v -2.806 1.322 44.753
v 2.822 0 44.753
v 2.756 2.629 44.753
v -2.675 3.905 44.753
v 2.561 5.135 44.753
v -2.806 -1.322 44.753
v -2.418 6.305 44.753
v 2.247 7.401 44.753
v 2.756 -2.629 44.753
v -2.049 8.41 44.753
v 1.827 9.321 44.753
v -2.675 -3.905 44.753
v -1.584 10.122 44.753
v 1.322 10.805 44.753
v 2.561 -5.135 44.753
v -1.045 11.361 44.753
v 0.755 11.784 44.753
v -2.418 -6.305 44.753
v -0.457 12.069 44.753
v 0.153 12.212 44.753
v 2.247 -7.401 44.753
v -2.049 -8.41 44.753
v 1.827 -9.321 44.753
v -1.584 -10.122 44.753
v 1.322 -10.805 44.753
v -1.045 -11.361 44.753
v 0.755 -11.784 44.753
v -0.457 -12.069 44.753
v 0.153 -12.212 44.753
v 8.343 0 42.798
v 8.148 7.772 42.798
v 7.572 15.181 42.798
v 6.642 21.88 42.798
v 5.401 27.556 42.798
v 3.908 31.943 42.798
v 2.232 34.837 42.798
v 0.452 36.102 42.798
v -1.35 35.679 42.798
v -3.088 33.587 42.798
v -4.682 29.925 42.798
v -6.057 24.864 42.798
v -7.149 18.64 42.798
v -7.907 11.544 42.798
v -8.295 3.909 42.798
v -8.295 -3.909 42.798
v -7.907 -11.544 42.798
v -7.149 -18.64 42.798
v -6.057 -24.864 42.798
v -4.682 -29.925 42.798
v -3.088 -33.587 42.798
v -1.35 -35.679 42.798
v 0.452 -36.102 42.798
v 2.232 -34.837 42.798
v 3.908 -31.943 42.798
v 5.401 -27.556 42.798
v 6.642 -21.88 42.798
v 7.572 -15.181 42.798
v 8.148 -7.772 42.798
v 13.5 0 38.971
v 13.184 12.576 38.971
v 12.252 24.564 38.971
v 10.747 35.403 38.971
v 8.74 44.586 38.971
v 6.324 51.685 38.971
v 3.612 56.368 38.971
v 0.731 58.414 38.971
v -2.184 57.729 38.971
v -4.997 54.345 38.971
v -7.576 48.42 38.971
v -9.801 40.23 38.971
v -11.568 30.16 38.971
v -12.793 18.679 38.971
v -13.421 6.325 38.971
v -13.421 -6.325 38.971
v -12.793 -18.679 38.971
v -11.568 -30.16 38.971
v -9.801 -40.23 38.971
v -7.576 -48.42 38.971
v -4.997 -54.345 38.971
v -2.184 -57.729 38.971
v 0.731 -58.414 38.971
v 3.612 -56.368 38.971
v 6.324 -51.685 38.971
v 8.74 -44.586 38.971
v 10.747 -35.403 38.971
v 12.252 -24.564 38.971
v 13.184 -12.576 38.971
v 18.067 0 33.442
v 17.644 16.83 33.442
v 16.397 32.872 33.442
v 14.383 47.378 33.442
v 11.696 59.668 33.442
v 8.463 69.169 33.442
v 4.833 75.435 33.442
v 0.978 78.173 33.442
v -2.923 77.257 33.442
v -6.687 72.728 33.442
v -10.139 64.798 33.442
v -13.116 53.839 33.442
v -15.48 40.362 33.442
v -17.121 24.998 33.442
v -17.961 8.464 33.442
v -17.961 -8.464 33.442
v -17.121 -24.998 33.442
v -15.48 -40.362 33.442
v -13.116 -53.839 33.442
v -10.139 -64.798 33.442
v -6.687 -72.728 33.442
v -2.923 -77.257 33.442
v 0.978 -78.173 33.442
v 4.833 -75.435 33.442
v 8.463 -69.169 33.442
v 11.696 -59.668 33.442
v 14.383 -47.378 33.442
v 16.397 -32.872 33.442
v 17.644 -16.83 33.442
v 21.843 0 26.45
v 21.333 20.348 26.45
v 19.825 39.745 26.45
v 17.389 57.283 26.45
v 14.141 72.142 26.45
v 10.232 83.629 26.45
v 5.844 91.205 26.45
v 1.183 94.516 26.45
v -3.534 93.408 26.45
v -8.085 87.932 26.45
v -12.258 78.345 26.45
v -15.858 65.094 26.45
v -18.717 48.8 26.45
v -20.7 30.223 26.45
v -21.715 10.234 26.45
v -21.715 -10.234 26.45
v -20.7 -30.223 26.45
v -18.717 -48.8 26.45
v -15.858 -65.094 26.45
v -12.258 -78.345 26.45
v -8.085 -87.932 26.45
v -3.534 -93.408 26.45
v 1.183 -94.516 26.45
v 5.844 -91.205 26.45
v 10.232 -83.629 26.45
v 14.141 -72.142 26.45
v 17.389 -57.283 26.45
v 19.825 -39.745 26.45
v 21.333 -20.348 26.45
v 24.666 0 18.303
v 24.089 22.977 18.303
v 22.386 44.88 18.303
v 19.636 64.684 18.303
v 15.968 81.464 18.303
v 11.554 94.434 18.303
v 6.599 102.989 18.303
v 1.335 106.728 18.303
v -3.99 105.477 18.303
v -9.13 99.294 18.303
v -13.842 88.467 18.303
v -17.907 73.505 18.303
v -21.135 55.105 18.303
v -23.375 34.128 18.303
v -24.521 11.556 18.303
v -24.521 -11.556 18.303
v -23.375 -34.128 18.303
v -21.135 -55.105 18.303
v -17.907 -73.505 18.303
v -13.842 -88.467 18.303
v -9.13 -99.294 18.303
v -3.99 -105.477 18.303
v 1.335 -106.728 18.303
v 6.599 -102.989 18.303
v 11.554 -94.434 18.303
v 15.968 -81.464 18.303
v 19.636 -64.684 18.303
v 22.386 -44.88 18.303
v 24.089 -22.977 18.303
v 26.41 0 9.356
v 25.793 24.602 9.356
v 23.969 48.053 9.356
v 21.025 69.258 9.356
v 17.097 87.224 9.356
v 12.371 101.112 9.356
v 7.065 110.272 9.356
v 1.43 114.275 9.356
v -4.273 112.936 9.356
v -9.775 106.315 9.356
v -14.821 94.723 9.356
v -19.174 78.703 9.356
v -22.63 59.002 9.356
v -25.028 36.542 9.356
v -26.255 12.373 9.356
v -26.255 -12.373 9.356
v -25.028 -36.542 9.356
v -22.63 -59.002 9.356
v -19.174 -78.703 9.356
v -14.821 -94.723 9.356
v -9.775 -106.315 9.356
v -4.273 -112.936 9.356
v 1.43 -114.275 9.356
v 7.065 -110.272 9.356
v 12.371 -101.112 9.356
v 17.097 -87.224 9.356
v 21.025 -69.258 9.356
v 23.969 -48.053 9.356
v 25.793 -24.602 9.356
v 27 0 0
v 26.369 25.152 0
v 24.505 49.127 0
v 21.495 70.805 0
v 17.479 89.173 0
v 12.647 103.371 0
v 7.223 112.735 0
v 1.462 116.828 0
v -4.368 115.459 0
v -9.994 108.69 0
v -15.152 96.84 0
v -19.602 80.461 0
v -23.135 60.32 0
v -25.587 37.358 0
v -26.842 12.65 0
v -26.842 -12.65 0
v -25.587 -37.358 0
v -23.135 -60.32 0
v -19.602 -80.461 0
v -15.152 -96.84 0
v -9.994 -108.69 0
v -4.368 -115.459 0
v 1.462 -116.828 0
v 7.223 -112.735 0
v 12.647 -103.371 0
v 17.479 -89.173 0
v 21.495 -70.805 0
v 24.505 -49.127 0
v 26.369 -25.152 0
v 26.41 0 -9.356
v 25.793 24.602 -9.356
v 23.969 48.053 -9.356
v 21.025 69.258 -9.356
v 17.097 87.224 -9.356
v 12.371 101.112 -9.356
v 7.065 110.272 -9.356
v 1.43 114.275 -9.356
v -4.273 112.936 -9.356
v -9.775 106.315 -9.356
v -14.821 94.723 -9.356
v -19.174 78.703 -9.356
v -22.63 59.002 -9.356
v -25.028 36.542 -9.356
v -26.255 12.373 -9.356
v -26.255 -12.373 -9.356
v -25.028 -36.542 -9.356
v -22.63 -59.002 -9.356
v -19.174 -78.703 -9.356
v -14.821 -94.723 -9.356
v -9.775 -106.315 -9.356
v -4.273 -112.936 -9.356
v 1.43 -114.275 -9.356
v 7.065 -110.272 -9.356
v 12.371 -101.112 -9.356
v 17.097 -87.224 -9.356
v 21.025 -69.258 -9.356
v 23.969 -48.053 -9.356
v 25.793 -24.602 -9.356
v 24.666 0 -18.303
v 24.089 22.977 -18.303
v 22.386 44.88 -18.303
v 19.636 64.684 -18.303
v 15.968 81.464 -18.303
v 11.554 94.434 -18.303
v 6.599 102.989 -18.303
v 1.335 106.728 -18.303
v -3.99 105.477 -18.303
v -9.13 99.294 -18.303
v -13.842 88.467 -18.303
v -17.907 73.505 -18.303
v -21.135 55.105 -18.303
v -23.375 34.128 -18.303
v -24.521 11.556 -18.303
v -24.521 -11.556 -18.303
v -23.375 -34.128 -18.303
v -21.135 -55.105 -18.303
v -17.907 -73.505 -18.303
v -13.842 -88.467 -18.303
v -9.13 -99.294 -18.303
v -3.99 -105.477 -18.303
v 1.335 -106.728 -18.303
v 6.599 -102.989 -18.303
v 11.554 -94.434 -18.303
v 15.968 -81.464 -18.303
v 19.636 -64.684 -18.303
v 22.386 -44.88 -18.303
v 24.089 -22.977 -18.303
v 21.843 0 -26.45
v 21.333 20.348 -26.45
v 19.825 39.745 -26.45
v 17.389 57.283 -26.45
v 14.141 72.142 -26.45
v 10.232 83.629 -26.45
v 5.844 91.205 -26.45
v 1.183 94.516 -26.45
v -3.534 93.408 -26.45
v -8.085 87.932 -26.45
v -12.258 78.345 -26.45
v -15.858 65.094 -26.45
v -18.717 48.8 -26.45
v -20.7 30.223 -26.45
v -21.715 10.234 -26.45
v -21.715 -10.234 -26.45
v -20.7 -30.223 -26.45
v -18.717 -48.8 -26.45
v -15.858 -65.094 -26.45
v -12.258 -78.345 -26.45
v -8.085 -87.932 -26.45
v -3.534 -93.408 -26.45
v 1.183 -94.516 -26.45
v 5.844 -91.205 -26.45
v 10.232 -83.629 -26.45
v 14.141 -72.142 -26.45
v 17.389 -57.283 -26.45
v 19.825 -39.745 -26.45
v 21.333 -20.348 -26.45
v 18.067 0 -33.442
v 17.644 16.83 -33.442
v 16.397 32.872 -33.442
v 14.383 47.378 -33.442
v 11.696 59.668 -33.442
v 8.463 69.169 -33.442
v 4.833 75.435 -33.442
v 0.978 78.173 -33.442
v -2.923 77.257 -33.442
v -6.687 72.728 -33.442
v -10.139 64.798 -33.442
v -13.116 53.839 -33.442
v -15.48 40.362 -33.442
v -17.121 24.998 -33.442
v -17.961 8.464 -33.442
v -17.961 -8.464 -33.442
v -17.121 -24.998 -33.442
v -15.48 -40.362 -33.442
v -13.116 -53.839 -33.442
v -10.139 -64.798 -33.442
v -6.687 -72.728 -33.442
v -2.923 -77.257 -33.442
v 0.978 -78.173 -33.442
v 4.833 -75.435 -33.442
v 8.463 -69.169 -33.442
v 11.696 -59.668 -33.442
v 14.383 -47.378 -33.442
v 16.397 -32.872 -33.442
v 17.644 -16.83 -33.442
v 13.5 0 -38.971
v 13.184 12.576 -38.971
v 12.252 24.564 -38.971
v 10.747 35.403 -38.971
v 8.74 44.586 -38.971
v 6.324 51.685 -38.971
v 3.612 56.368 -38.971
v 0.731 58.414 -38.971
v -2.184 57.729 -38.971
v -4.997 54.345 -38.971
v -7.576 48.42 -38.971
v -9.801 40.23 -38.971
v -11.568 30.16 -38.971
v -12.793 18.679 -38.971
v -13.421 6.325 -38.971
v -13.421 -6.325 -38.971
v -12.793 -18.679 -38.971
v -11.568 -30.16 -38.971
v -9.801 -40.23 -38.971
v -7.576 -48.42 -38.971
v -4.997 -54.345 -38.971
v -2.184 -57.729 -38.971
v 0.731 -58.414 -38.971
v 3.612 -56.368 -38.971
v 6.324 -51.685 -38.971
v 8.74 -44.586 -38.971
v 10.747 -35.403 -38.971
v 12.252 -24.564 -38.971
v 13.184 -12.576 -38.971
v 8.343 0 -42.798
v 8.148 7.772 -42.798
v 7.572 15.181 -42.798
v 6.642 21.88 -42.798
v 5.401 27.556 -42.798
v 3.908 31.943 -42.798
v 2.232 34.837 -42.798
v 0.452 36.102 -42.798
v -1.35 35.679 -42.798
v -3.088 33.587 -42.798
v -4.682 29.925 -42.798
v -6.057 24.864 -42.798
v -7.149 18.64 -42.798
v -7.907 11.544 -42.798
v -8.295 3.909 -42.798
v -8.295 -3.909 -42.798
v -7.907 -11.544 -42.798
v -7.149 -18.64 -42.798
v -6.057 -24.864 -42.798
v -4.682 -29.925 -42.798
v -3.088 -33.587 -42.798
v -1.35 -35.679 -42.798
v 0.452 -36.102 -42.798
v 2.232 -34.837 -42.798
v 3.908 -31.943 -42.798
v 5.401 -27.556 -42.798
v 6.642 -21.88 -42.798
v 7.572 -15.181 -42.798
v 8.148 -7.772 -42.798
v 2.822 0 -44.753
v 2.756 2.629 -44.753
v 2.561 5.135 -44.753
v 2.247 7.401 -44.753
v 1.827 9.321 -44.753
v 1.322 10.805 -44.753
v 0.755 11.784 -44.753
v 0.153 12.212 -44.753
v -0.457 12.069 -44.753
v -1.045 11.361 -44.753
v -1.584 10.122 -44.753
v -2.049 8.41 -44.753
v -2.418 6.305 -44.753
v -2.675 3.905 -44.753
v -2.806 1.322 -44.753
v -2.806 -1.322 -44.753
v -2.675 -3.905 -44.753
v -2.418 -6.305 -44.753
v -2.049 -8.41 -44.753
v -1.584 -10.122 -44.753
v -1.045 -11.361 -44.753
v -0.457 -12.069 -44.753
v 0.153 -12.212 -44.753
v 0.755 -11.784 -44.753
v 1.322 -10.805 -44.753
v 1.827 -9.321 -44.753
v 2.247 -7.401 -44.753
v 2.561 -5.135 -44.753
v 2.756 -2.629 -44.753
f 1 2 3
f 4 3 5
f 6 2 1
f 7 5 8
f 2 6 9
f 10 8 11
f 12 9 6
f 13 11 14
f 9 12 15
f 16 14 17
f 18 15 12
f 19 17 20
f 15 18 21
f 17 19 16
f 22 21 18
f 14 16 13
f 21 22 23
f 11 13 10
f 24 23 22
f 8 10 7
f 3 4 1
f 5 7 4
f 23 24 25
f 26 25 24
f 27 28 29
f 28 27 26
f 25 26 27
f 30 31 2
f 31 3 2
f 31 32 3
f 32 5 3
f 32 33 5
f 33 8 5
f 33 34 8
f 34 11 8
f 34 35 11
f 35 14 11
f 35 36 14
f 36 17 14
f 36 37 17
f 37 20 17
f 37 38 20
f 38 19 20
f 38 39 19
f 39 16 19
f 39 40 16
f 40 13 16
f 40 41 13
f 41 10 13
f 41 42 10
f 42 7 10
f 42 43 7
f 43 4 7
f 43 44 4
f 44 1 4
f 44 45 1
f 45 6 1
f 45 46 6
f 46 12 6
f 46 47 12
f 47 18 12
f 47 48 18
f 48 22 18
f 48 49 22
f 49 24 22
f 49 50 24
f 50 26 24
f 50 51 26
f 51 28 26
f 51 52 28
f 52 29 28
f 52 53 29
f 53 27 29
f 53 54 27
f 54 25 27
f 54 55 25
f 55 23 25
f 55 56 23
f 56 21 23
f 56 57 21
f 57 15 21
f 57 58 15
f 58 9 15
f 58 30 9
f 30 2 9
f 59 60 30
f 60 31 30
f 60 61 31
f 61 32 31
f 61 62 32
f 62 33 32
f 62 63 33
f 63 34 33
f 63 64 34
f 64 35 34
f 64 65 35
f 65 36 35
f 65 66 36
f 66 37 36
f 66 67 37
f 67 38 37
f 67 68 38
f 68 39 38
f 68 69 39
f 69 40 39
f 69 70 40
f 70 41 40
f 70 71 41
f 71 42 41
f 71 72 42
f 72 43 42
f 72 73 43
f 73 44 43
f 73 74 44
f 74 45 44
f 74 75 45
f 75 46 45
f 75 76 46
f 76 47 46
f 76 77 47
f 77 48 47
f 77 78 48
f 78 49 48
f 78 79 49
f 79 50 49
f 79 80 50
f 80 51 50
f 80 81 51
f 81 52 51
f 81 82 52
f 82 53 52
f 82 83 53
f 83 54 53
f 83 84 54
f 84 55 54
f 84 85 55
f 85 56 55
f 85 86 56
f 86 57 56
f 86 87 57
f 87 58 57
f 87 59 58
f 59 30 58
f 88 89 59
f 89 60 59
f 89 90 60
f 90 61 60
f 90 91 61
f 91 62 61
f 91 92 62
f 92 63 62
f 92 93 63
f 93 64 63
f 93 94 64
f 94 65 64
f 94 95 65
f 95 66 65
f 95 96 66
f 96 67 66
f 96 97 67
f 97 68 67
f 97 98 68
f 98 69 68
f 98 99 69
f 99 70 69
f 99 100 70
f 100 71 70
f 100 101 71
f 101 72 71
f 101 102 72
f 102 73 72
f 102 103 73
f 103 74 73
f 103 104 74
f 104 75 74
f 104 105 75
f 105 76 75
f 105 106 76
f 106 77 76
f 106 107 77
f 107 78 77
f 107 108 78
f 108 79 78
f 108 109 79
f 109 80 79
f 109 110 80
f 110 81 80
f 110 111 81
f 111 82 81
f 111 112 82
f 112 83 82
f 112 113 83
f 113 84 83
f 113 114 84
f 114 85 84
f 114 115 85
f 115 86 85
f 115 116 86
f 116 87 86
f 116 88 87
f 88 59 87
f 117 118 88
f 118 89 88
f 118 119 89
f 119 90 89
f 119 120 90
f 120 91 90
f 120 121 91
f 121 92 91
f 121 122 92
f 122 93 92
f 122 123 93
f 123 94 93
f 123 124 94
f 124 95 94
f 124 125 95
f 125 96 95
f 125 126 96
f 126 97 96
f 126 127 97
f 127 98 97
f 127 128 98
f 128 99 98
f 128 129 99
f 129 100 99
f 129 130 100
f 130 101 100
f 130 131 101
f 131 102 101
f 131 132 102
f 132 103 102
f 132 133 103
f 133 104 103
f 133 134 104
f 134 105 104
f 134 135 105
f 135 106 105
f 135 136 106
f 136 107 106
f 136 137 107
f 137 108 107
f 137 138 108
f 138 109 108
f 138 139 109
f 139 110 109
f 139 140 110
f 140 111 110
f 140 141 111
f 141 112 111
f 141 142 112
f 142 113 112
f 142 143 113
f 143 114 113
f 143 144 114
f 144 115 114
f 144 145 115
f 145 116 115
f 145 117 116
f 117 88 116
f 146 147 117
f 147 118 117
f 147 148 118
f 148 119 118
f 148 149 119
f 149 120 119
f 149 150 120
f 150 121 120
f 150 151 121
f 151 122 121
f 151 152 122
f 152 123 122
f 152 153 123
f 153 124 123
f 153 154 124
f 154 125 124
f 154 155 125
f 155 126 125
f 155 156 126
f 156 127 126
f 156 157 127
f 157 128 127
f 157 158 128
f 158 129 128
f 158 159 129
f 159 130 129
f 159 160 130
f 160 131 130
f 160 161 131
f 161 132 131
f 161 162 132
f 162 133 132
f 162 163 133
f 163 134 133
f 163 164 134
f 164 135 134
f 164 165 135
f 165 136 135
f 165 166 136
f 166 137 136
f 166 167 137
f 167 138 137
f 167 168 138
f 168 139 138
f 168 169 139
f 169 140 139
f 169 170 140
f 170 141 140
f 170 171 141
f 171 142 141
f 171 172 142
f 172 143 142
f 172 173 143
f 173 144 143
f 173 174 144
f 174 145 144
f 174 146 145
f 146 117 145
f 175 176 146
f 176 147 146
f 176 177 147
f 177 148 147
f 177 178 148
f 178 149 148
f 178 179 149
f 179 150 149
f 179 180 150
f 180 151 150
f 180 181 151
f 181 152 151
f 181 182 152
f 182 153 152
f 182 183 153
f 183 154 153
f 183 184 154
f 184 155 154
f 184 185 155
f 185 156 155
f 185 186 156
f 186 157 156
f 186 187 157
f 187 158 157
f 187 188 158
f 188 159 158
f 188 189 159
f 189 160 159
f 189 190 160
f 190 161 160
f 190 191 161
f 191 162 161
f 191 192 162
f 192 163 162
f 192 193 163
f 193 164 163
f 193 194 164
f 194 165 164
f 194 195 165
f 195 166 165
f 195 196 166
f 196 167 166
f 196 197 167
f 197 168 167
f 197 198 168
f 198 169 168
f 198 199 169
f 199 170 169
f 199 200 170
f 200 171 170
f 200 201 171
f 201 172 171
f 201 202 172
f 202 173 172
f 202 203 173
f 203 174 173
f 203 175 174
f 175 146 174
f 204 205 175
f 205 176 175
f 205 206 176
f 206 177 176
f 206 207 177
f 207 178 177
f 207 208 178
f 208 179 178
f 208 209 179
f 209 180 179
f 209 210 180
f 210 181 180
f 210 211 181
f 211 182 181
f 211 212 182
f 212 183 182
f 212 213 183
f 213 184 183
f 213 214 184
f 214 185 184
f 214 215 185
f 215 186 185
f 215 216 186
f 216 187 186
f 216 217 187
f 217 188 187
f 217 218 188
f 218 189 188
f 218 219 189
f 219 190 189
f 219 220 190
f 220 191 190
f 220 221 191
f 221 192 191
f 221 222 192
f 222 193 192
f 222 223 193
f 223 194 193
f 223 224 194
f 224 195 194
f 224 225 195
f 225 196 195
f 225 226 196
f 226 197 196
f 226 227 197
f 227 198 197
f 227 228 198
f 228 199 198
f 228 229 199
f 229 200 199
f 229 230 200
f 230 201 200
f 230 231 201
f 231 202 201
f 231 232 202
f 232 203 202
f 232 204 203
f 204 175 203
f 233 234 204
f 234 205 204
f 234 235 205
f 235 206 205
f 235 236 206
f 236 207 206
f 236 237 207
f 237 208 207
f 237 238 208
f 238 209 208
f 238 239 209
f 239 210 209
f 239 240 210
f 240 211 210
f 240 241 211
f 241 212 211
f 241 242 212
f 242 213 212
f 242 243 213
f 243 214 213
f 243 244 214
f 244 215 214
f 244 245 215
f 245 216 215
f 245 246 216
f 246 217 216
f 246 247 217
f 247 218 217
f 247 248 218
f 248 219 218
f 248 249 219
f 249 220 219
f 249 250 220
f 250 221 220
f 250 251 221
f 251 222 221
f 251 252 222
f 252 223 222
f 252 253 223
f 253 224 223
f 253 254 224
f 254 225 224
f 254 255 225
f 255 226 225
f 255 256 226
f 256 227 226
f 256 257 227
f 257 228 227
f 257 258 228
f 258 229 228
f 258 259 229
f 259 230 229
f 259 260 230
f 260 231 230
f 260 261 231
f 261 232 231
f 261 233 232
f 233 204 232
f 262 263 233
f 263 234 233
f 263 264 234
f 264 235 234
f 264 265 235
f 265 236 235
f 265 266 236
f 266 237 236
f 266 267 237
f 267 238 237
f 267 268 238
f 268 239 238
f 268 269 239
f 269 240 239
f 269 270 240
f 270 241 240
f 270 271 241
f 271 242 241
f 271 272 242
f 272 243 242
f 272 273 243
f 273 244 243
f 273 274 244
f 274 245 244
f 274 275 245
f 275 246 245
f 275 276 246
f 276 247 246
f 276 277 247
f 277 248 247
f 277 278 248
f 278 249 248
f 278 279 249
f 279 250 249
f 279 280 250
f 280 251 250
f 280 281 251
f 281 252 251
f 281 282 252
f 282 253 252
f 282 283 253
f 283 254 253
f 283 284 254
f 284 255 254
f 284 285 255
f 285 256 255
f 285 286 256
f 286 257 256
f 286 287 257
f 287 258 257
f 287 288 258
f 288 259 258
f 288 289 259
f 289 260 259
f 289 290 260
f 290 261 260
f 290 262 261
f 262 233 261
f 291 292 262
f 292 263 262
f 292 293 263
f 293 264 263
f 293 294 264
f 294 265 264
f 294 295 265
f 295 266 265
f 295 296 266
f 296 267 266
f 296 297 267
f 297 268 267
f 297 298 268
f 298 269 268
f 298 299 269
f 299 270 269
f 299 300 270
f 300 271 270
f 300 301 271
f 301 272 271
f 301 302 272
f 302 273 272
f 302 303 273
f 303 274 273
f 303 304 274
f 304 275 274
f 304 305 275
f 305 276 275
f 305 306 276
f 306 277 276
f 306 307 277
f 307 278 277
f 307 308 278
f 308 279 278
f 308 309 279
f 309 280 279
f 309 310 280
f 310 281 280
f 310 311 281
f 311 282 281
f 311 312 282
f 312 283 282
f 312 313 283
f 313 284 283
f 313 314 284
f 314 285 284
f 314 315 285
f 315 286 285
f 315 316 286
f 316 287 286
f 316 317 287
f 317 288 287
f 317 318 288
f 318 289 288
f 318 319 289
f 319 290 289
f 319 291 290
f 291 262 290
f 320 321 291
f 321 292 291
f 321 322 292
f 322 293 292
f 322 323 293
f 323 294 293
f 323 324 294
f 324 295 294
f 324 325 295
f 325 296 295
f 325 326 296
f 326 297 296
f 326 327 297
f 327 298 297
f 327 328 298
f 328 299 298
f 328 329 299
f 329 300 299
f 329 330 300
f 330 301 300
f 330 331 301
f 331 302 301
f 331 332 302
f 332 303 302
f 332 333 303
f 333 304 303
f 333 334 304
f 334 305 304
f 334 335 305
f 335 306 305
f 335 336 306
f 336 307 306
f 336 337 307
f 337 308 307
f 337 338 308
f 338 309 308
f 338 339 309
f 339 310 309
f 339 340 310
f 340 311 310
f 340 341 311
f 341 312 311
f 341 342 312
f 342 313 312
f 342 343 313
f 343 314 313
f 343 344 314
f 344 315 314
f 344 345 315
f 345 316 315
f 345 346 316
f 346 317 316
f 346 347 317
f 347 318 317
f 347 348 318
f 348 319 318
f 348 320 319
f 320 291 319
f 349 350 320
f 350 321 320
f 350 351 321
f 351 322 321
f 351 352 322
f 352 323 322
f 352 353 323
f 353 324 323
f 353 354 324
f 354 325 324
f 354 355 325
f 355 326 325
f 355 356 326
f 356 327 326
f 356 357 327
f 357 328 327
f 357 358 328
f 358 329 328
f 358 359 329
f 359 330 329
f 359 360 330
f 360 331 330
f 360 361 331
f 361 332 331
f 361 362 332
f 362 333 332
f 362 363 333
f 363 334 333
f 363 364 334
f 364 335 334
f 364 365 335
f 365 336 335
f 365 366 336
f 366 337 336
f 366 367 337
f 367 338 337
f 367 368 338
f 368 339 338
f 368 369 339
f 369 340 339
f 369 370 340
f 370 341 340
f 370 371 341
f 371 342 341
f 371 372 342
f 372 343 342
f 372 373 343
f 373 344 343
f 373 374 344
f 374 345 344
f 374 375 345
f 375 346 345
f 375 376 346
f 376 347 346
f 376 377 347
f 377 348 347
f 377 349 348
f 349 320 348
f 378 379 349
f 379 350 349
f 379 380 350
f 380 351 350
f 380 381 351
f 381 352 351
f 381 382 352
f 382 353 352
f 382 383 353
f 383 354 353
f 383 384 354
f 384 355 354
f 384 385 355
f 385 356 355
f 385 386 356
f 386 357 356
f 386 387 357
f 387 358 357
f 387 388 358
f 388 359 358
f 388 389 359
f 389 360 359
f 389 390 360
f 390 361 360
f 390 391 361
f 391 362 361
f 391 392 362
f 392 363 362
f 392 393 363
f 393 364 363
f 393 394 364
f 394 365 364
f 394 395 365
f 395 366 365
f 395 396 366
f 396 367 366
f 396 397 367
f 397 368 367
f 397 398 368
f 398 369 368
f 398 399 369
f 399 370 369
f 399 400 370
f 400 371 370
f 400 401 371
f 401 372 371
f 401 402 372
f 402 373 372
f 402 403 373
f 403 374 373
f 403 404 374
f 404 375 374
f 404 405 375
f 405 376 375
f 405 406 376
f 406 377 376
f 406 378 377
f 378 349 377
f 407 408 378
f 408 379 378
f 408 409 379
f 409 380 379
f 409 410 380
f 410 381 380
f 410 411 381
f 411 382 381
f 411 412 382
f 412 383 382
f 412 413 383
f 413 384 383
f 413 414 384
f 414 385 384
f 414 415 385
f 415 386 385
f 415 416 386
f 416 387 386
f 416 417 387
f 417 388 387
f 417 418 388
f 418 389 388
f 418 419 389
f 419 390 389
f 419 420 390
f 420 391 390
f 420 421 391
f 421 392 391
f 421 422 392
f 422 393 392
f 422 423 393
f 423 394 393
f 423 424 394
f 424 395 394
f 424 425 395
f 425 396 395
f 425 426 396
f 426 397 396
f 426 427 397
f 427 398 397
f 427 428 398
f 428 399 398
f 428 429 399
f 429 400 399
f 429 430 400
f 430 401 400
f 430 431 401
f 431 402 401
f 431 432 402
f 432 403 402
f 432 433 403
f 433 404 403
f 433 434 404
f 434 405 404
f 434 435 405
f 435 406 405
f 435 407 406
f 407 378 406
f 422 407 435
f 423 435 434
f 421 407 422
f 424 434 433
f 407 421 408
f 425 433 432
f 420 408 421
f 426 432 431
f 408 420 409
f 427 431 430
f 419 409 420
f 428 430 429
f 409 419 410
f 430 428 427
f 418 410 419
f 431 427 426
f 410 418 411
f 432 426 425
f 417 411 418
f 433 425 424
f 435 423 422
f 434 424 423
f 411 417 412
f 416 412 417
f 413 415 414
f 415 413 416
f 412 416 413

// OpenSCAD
// Generated by SolidPython 1.0.1 on 2020-07-29 00:46:45


scale(v = [3, 13, 5]) {
	sphere(r = 9);
}
/***********************************************
*********      SolidPython code:      **********
************************************************
 
# import packages: SolidPython
from solid import *
from solid.utils import *
from itertools import chain, combinations, permutations


class Resize:

    def __init__(self, scad_file):
        self.scad_file = scad_file
        #self.scad_file = import_scad(scad_file)
        # cone/cylinder param:
        self.r1 = 0
        self.r2 = 0
        self.h = 0
        # rectangular prism param:
        self.w = 0
        self.l = 0
        # ellipse param:
        self.r = 0

    # import OpenScad code (file name corresponds to shape)


    # classify shape + parameters
    def assign(self, param1, param2, param3):
        if self.scad_file == 'cone.scad':
            self.r1 = param1
            self.r2 = param2
            self.h = param3
        elif self.scad_file == 'cylinder.scad':
            self.r1 = param1
            self.r2 = param2
            self.h = param3
        elif self.scad_file == 'rectangularPrism.scad':
            self.h = param1
            self.l = param2
            self.w = param3
        else:
            self.r = param1
            self.h = param2

    # resize parameters
    def iterate(self):
        x = range(3, 20, 2)
        i = 1
        if self.scad_file == 'cone.scad':
            tempList = list(permutations(x, 2))
            for temp in tempList:
                param1 = temp[0]
                param2 = temp[1]
                filepath = 'produced_scad_files/' + 'cone' + str(param1) + '_' + str(param2) + '_' + '.scad'
                scad_render_to_file(cylinder(h=param1, r1=param2, r2=0), filepath)

        elif self.scad_file == 'cylinder.scad':
            tempList = list(permutations(x, 3))
            for temp in tempList:
                param1 = temp[0]
                param2 = temp[1]
                filepath = 'produced_scad_files/' + 'cylinder' + str(param1) + '_' + str(param2) + '_' + '.scad'
                scad_render_to_file(cylinder(h=param1, r1=param2, r2=param2), filepath)

        elif self.scad_file == 'rectangularPrism.scad':
            tempList = list(permutations(x, 3))
            for temp in tempList:
                param1 = temp[0]
                param2 = temp[1]
                param3 = temp[2]
                filepath = 'produced_scad_files/' + 'rectangularPrism' + str(param1) + '_' + str(param2) + '_' + str(
                    param3) + '.scad'
                scad_render_to_file(cube(size=(param1, param2, param3)), filepath)

        elif self.scad_file == 'ellipse.scad':
            tempList = list(permutations(x, 4))
            for temp in tempList:
                param1 = temp[0]
                param2 = temp[1]
                param3 = temp[2]
                param4 = temp[3]
                filepath = 'produced_scad_files/' + 'ellipse' + str(param1) + '_' + str(param2) + '_' + str(param3) + '_' + str(param4) + '.scad'
                scad_render_to_file(scale([param1, param2, param3])(sphere(r=param4)), filepath)

    def render_to_scadfile(self):
        scad_render_to_file(scad, 'example.scad') 
 
************************************************/
